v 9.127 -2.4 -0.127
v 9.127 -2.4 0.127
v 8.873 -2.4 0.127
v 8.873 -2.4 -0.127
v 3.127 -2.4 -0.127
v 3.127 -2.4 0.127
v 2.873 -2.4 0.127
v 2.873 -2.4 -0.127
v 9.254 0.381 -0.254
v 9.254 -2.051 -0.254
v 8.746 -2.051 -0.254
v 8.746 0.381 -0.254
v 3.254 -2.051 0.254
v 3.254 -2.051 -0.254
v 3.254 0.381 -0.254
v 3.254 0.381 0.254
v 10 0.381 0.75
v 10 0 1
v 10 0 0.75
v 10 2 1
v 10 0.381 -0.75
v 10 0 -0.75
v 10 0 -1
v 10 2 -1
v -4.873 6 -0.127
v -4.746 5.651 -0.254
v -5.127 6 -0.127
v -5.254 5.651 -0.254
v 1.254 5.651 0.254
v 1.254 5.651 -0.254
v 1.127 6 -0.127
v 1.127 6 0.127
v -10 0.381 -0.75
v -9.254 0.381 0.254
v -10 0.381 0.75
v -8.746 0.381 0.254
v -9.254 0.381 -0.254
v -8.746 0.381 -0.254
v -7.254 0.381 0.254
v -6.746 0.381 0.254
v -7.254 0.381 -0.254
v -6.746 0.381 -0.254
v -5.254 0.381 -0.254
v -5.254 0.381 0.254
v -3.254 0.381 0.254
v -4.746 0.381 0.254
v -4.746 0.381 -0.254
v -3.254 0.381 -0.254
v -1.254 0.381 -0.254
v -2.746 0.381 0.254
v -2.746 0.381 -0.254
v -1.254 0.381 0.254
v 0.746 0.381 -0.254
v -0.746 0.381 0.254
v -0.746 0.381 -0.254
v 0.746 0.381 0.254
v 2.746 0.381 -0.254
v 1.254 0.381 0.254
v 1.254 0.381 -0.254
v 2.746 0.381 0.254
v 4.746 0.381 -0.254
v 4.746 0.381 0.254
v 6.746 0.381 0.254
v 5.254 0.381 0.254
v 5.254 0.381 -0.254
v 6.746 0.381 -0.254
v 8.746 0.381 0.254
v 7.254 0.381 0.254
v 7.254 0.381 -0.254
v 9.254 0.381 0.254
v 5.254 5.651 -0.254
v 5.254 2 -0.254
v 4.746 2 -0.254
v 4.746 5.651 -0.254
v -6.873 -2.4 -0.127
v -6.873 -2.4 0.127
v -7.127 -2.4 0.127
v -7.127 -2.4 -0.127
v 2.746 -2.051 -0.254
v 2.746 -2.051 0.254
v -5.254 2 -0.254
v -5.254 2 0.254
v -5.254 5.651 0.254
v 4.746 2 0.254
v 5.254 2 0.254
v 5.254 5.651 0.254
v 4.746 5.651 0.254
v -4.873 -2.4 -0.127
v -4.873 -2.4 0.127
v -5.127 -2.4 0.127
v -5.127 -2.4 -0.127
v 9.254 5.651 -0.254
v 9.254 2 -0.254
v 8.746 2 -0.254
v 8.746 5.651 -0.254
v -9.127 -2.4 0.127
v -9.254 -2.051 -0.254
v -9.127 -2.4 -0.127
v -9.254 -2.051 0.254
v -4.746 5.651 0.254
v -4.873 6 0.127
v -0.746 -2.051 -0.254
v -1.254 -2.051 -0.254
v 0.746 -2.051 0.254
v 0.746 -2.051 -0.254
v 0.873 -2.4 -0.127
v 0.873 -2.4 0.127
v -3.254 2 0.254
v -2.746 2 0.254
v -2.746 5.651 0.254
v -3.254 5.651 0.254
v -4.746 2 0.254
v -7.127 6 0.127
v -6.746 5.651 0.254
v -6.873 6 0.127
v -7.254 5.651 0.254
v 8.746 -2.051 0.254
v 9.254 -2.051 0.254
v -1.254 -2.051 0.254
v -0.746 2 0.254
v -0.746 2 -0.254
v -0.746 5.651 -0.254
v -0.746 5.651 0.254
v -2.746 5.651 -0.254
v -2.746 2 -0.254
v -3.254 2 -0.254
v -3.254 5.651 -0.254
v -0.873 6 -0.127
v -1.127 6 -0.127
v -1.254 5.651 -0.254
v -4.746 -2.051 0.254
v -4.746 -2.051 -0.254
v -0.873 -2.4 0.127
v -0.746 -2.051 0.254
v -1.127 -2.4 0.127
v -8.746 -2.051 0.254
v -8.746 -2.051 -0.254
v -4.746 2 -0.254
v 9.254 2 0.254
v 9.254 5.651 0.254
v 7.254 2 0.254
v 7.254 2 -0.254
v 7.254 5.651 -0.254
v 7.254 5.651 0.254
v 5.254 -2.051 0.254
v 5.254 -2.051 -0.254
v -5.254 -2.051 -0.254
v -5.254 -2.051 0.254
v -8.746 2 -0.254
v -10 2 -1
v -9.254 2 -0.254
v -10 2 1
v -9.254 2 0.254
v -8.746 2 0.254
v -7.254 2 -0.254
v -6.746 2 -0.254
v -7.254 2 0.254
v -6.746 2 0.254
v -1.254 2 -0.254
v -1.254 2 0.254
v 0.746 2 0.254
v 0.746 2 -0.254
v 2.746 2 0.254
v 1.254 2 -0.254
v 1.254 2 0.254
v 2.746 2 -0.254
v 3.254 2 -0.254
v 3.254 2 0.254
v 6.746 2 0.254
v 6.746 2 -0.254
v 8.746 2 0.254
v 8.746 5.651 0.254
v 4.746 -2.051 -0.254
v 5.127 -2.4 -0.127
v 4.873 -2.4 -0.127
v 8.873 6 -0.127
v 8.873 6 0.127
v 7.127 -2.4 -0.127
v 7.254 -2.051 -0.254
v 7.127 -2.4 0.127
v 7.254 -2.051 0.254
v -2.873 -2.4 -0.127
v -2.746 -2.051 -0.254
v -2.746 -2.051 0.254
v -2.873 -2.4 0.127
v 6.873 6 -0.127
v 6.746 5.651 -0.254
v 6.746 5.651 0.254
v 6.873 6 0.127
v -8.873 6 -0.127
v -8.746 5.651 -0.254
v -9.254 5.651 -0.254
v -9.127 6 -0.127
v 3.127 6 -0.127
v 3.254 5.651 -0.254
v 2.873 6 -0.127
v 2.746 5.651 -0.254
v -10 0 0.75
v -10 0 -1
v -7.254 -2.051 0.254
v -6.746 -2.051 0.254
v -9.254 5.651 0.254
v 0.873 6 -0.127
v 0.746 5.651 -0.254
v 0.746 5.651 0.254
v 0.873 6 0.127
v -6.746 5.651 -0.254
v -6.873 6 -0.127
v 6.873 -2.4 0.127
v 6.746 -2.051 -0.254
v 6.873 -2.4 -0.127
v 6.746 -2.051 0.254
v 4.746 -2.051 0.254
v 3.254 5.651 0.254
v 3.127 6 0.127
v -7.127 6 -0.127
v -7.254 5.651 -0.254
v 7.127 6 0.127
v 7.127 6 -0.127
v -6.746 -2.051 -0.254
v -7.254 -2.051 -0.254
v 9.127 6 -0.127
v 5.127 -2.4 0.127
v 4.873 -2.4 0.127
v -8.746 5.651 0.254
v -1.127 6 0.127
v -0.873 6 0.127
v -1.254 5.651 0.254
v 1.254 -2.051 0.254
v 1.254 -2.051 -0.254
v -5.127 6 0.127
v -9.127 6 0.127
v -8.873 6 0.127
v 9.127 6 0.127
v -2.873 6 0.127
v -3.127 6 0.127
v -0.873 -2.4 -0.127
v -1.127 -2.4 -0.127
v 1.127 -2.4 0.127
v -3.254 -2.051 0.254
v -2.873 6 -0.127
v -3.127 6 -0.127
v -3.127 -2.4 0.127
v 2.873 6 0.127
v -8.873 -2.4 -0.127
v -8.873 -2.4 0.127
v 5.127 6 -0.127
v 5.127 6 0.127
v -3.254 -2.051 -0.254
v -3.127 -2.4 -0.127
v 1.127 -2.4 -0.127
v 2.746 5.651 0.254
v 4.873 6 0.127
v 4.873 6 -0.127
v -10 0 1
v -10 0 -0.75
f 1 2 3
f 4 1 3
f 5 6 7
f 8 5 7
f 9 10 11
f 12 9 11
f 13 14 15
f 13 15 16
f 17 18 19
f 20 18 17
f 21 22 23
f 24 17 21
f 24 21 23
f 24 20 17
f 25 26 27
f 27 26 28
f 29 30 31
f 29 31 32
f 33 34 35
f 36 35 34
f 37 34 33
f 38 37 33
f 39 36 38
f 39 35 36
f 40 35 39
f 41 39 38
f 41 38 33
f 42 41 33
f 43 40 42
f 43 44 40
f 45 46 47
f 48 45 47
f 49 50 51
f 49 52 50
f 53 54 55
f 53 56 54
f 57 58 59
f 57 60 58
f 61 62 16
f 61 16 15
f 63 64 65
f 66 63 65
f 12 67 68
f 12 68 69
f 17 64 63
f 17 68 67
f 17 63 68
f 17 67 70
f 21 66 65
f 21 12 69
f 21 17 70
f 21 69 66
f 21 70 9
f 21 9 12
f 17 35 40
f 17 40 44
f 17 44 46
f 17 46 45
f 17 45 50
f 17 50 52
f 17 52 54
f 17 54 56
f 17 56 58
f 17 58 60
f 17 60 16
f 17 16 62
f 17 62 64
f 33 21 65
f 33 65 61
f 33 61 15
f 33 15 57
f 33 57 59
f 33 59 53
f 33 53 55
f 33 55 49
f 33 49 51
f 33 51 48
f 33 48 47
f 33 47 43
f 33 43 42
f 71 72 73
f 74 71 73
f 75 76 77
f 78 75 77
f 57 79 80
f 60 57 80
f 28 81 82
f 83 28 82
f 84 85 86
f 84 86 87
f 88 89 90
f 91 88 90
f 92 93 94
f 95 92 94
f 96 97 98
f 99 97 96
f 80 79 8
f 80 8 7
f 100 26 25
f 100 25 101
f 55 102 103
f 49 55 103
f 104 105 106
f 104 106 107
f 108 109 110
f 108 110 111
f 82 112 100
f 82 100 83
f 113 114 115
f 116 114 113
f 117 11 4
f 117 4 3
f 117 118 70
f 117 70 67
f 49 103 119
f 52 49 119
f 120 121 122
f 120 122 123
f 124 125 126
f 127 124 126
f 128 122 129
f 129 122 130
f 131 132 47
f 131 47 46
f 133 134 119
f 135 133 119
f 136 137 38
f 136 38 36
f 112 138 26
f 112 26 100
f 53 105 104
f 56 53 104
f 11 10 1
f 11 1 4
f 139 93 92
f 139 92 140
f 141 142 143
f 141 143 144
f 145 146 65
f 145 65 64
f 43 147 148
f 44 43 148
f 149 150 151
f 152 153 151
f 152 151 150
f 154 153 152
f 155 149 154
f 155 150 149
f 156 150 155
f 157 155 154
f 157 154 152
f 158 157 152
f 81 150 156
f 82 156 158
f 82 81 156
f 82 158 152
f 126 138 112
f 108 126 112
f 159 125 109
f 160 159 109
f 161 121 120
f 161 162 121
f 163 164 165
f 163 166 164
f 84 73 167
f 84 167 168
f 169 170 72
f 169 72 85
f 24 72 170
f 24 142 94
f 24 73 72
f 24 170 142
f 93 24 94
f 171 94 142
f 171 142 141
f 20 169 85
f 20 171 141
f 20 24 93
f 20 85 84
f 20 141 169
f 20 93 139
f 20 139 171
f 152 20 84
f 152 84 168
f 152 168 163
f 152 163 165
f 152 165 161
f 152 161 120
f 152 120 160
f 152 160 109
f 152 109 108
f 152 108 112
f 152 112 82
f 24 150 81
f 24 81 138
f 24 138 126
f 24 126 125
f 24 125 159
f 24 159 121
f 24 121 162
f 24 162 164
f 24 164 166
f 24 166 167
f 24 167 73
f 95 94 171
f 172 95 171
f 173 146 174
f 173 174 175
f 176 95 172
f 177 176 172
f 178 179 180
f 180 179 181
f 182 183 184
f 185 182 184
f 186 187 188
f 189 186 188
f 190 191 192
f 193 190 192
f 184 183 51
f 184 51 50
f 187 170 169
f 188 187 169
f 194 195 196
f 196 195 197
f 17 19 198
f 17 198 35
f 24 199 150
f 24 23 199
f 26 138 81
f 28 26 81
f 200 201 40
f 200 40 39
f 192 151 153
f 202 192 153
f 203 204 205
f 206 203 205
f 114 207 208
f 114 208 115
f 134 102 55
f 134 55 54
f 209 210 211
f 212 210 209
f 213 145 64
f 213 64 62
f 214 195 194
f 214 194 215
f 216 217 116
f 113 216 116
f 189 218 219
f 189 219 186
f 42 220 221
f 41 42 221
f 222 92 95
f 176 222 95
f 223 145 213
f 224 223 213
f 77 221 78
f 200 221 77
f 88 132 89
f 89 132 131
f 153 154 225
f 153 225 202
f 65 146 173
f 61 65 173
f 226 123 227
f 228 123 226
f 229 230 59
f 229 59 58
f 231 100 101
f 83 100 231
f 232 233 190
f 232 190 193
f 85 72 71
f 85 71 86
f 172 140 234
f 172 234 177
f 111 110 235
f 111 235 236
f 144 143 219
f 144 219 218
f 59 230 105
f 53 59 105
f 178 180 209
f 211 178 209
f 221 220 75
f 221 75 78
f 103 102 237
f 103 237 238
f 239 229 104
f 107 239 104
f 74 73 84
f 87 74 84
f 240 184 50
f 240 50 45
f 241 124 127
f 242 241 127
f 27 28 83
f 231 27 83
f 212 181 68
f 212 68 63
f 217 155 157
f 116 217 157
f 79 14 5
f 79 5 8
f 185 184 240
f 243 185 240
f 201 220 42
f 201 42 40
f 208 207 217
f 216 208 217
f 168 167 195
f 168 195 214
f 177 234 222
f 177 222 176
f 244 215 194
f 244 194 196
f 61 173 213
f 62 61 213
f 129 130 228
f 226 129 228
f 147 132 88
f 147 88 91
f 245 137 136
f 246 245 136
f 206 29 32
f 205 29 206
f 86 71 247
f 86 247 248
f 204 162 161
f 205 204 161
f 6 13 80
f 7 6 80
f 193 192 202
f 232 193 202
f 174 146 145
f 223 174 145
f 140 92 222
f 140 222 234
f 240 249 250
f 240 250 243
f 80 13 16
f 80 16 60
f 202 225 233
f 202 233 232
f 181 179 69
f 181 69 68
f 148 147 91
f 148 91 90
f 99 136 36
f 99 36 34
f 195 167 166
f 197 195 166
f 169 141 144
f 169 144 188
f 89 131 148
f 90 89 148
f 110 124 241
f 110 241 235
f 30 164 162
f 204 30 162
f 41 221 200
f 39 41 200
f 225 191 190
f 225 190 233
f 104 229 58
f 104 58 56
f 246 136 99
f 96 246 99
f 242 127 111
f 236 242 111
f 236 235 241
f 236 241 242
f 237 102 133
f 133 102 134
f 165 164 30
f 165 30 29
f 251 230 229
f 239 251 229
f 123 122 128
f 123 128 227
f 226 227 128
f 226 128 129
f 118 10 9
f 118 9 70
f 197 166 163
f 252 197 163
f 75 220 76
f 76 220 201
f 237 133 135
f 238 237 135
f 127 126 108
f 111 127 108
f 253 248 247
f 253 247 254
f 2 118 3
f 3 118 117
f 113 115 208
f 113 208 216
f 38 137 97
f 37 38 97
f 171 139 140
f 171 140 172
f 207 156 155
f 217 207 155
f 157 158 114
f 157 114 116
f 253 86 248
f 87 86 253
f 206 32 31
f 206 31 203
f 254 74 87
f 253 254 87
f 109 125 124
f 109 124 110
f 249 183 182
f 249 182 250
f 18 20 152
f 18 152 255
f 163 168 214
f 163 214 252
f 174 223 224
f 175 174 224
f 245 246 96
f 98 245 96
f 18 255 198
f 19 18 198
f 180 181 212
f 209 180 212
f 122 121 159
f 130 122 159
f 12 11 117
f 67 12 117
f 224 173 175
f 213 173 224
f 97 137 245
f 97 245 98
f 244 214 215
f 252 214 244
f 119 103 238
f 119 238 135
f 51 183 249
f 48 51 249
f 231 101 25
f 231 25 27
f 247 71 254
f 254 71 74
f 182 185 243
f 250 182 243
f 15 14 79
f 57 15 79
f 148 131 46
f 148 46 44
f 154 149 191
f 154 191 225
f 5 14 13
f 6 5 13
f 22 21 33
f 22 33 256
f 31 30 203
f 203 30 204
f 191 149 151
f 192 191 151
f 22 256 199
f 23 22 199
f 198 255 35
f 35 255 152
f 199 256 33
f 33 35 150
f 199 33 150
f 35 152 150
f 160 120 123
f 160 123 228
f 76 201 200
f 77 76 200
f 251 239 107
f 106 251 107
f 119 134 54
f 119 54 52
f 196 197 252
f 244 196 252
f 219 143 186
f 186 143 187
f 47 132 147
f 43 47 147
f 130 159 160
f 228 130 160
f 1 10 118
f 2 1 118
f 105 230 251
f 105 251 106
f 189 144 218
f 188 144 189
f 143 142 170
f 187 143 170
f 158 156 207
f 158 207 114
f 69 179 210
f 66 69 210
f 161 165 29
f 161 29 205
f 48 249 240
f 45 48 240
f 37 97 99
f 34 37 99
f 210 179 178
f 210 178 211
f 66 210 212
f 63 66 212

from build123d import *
from OCP.BRepFilletAPI import BRepFilletAPI_MakeChamfer

# Parameters (mm, degrees)
BASE_EXTRUDE_DEPTH                 = 10
PINBODY_START                      = -4.4
SKETCH2_W                          = 0.508
SKETCH2_H                          = 0.508
PINBODY_DEPTH                      = 8.4
PINSCHAMFER_SIZE                   = 0.127
PINSCHAMFER_SIZE2                  = 0.348929632
LPATTERN1_COUNT                    = 5
LPATTERN1_PITCH                    = 2
PINSCHAMFER_OF_LPATTERN1_SIZE      = 0.127
PINSCHAMFER_OF_LPATTERN1_SIZE2     = 0.348929632
LPATTERN1_COL_COUNT                = 6
LPATTERN1_COL_PITCH                = 2.000000064
PINSCHAMFER_OF_LPATTERN1_COL_SIZE  = 0.127
PINSCHAMFER_OF_LPATTERN1_COL_SIZE2 = 0.348929632


with BuildPart() as part:
    # Sketch1 → Base-Extrude (new, symmetric)
    with BuildSketch(Plane(origin=(0, 0, 0), x_dir=(0, 0, -1), z_dir=(1, 0, 0))):
        Polygon((1, 0.409926053), (1, 2), (-1, 2), (-1, 0.409926053), (-1, 0), (-0.75, 0), (-0.75, 0.381), (0.75, 0.381), (0.75, 0), (1, 0), align=None)
    extrude(amount=BASE_EXTRUDE_DEPTH, both=True)

    # Sketch2 → PINBODY (add)
    with BuildSketch(Plane(origin=(0, 2, 0), x_dir=(-1, 0, 0), z_dir=(0, 1, 0)).offset(PINBODY_START)):
        with Locations((1, 0)):
            Rectangle(SKETCH2_W, SKETCH2_H)
    pinbody = extrude(amount=PINBODY_DEPTH)

    # pinsCHAMFER: one chamfer whose edges measure the first distance from different faces: ONE call of the kernel's chamfer builder (chamfer() names one face for all edges)
    pinschamfer_edges_1 = [part.edges().sort_by_distance(p)[0] for p in [
        (-1.254, -2.4, 0),
        (-1, -2.4, 0.254),
        (-0.746, -2.4, 0),
        (-1, -2.4, -0.254),
    ]]
    pinschamfer_side_1 = [part.faces().sort_by_distance(p)[0] for p in [
        (-1, -2.4, 0),
    ]]
    pinschamfer_edges_2 = [part.edges().sort_by_distance(p)[0] for p in [
        (-1.254, 6, 0),
        (-1, 6, 0.254),
        (-0.746, 6, 0),
        (-1, 6, -0.254),
    ]]
    pinschamfer_side_2 = [part.faces().sort_by_distance(p)[0] for p in [
        (-1, 6, 0),
    ]]
    pinschamfer = BRepFilletAPI_MakeChamfer(part.part.solid().wrapped)
    for e in pinschamfer_edges_1:
        pinschamfer.Add(PINSCHAMFER_SIZE, PINSCHAMFER_SIZE2, e.wrapped, pinschamfer_side_1[0].wrapped)  # the first distance lies on this face
    for e in pinschamfer_edges_2:
        pinschamfer.Add(PINSCHAMFER_SIZE, PINSCHAMFER_SIZE2, e.wrapped, pinschamfer_side_2[0].wrapped)  # the first distance lies on this face
    add(Compound.cast(pinschamfer.Shape()), mode=Mode.REPLACE)

    # LPattern1: PINBODY ×5
    with Locations(*[(-i * LPATTERN1_PITCH, 0, 0) for i in range(1, LPATTERN1_COUNT)]):
        add(pinbody)

    # pinsCHAMFER of LPattern1: one chamfer whose edges measure the first distance from different faces: ONE call of the kernel's chamfer builder (chamfer() names one face for all edges)
    pinschamfer_of_lpattern1_edges_1 = [part.edges().sort_by_distance(p)[0] for p in [
        (-3.254, -2.4, 0),
        (-3, -2.4, 0.254),
        (-2.746, -2.4, 0),
        (-3, -2.4, -0.254),
    ]]
    pinschamfer_of_lpattern1_side_1 = [part.faces().sort_by_distance(p)[0] for p in [
        (-3, -2.4, 0),
    ]]
    pinschamfer_of_lpattern1_edges_2 = [part.edges().sort_by_distance(p)[0] for p in [
        (-3.254, 6, 0),
        (-3, 6, 0.254),
        (-2.746, 6, 0),
        (-3, 6, -0.254),
    ]]
    pinschamfer_of_lpattern1_side_2 = [part.faces().sort_by_distance(p)[0] for p in [
        (-3, 6, 0),
    ]]
    pinschamfer_of_lpattern1_edges_3 = [part.edges().sort_by_distance(p)[0] for p in [
        (-5.254, -2.4, 0),
        (-5, -2.4, 0.254),
        (-4.746, -2.4, 0),
        (-5, -2.4, -0.254),
    ]]
    pinschamfer_of_lpattern1_side_3 = [part.faces().sort_by_distance(p)[0] for p in [
        (-5, -2.4, 0),
    ]]
    pinschamfer_of_lpattern1_edges_4 = [part.edges().sort_by_distance(p)[0] for p in [
        (-5.254, 6, 0),
        (-5, 6, 0.254),
        (-4.746, 6, 0),
        (-5, 6, -0.254),
    ]]
    pinschamfer_of_lpattern1_side_4 = [part.faces().sort_by_distance(p)[0] for p in [
        (-5, 6, 0),
    ]]
    pinschamfer_of_lpattern1_edges_5 = [part.edges().sort_by_distance(p)[0] for p in [
        (-7.254, -2.4, 0),
        (-7, -2.4, 0.254),
        (-6.746, -2.4, 0),
        (-7, -2.4, -0.254),
    ]]
    pinschamfer_of_lpattern1_side_5 = [part.faces().sort_by_distance(p)[0] for p in [
        (-7, -2.4, 0),
    ]]
    pinschamfer_of_lpattern1_edges_6 = [part.edges().sort_by_distance(p)[0] for p in [
        (-7.254, 6, 0),
        (-7, 6, 0.254),
        (-6.746, 6, 0),
        (-7, 6, -0.254),
    ]]
    pinschamfer_of_lpattern1_side_6 = [part.faces().sort_by_distance(p)[0] for p in [
        (-7, 6, 0),
    ]]
    pinschamfer_of_lpattern1_edges_7 = [part.edges().sort_by_distance(p)[0] for p in [
        (-9.254, -2.4, 0),
        (-9, -2.4, 0.254),
        (-8.746, -2.4, 0),
        (-9, -2.4, -0.254),
    ]]
    pinschamfer_of_lpattern1_side_7 = [part.faces().sort_by_distance(p)[0] for p in [
        (-9, -2.4, 0),
    ]]
    pinschamfer_of_lpattern1_edges_8 = [part.edges().sort_by_distance(p)[0] for p in [
        (-9.254, 6, 0),
        (-9, 6, 0.254),
        (-8.746, 6, 0),
        (-9, 6, -0.254),
    ]]
    pinschamfer_of_lpattern1_side_8 = [part.faces().sort_by_distance(p)[0] for p in [
        (-9, 6, 0),
    ]]
    pinschamfer_of_lpattern1 = BRepFilletAPI_MakeChamfer(part.part.solid().wrapped)
    for e in pinschamfer_of_lpattern1_edges_1:
        pinschamfer_of_lpattern1.Add(PINSCHAMFER_OF_LPATTERN1_SIZE, PINSCHAMFER_OF_LPATTERN1_SIZE2, e.wrapped, pinschamfer_of_lpattern1_side_1[0].wrapped)  # the first distance lies on this face
    for e in pinschamfer_of_lpattern1_edges_2:
        pinschamfer_of_lpattern1.Add(PINSCHAMFER_OF_LPATTERN1_SIZE, PINSCHAMFER_OF_LPATTERN1_SIZE2, e.wrapped, pinschamfer_of_lpattern1_side_2[0].wrapped)  # the first distance lies on this face
    for e in pinschamfer_of_lpattern1_edges_3:
        pinschamfer_of_lpattern1.Add(PINSCHAMFER_OF_LPATTERN1_SIZE, PINSCHAMFER_OF_LPATTERN1_SIZE2, e.wrapped, pinschamfer_of_lpattern1_side_3[0].wrapped)  # the first distance lies on this face
    for e in pinschamfer_of_lpattern1_edges_4:
        pinschamfer_of_lpattern1.Add(PINSCHAMFER_OF_LPATTERN1_SIZE, PINSCHAMFER_OF_LPATTERN1_SIZE2, e.wrapped, pinschamfer_of_lpattern1_side_4[0].wrapped)  # the first distance lies on this face
    for e in pinschamfer_of_lpattern1_edges_5:
        pinschamfer_of_lpattern1.Add(PINSCHAMFER_OF_LPATTERN1_SIZE, PINSCHAMFER_OF_LPATTERN1_SIZE2, e.wrapped, pinschamfer_of_lpattern1_side_5[0].wrapped)  # the first distance lies on this face
    for e in pinschamfer_of_lpattern1_edges_6:
        pinschamfer_of_lpattern1.Add(PINSCHAMFER_OF_LPATTERN1_SIZE, PINSCHAMFER_OF_LPATTERN1_SIZE2, e.wrapped, pinschamfer_of_lpattern1_side_6[0].wrapped)  # the first distance lies on this face
    for e in pinschamfer_of_lpattern1_edges_7:
        pinschamfer_of_lpattern1.Add(PINSCHAMFER_OF_LPATTERN1_SIZE, PINSCHAMFER_OF_LPATTERN1_SIZE2, e.wrapped, pinschamfer_of_lpattern1_side_7[0].wrapped)  # the first distance lies on this face
    for e in pinschamfer_of_lpattern1_edges_8:
        pinschamfer_of_lpattern1.Add(PINSCHAMFER_OF_LPATTERN1_SIZE, PINSCHAMFER_OF_LPATTERN1_SIZE2, e.wrapped, pinschamfer_of_lpattern1_side_8[0].wrapped)  # the first distance lies on this face
    add(Compound.cast(pinschamfer_of_lpattern1.Shape()), mode=Mode.REPLACE)

    # LPattern1 col: PINBODY ×6
    with Locations(*[(i * LPATTERN1_COL_PITCH, 0, 0) for i in range(1, LPATTERN1_COL_COUNT)]):
        add(pinbody)

    # pinsCHAMFER of LPattern1 col: one chamfer whose edges measure the first distance from different faces: ONE call of the kernel's chamfer builder (chamfer() names one face for all edges)
    pinschamfer_of_lpattern1_col_edges_1 = [part.edges().sort_by_distance(p)[0] for p in [
        (0.746000064, -2.4, 0),
        (1.000000064, -2.4, 0.254),
        (1.254000064, -2.4, 0),
        (1.000000064, -2.4, -0.254),
    ]]
    pinschamfer_of_lpattern1_col_side_1 = [part.faces().sort_by_distance(p)[0] for p in [
        (1.000000064, -2.4, 0),
    ]]
    pinschamfer_of_lpattern1_col_edges_2 = [part.edges().sort_by_distance(p)[0] for p in [
        (0.746000064, 6, 0),
        (1.000000064, 6, 0.254),
        (1.254000064, 6, 0),
        (1.000000064, 6, -0.254),
    ]]
    pinschamfer_of_lpattern1_col_side_2 = [part.faces().sort_by_distance(p)[0] for p in [
        (1.000000064, 6, 0),
    ]]
    pinschamfer_of_lpattern1_col_edges_3 = [part.edges().sort_by_distance(p)[0] for p in [
        (2.746000128, -2.4, 0),
        (3.000000128, -2.4, 0.254),
        (3.254000128, -2.4, 0),
        (3.000000128, -2.4, -0.254),
    ]]
    pinschamfer_of_lpattern1_col_side_3 = [part.faces().sort_by_distance(p)[0] for p in [
        (3.000000128, -2.4, 0),
    ]]
    pinschamfer_of_lpattern1_col_edges_4 = [part.edges().sort_by_distance(p)[0] for p in [
        (2.746000128, 6, 0),
        (3.000000128, 6, 0.254),
        (3.254000128, 6, 0),
        (3.000000128, 6, -0.254),
    ]]
    pinschamfer_of_lpattern1_col_side_4 = [part.faces().sort_by_distance(p)[0] for p in [
        (3.000000128, 6, 0),
    ]]
    pinschamfer_of_lpattern1_col_edges_5 = [part.edges().sort_by_distance(p)[0] for p in [
        (4.746000192, -2.4, 0),
        (5.000000192, -2.4, 0.254),
        (5.254000192, -2.4, 0),
        (5.000000192, -2.4, -0.254),
    ]]
    pinschamfer_of_lpattern1_col_side_5 = [part.faces().sort_by_distance(p)[0] for p in [
        (5.000000192, -2.4, 0),
    ]]
    pinschamfer_of_lpattern1_col_edges_6 = [part.edges().sort_by_distance(p)[0] for p in [
        (4.746000192, 6, 0),
        (5.000000192, 6, 0.254),
        (5.254000192, 6, 0),
        (5.000000192, 6, -0.254),
    ]]
    pinschamfer_of_lpattern1_col_side_6 = [part.faces().sort_by_distance(p)[0] for p in [
        (5.000000192, 6, 0),
    ]]
    pinschamfer_of_lpattern1_col_edges_7 = [part.edges().sort_by_distance(p)[0] for p in [
        (6.746000256, -2.4, 0),
        (7.000000256, -2.4, 0.254),
        (7.254000256, -2.4, 0),
        (7.000000256, -2.4, -0.254),
    ]]
    pinschamfer_of_lpattern1_col_side_7 = [part.faces().sort_by_distance(p)[0] for p in [
        (7.000000256, -2.4, 0),
    ]]
    pinschamfer_of_lpattern1_col_edges_8 = [part.edges().sort_by_distance(p)[0] for p in [
        (6.746000256, 6, 0),
        (7.000000256, 6, 0.254),
        (7.254000256, 6, 0),
        (7.000000256, 6, -0.254),
    ]]
    pinschamfer_of_lpattern1_col_side_8 = [part.faces().sort_by_distance(p)[0] for p in [
        (7.000000256, 6, 0),
    ]]
    pinschamfer_of_lpattern1_col_edges_9 = [part.edges().sort_by_distance(p)[0] for p in [
        (8.74600032, -2.4, 0),
        (9.00000032, -2.4, 0.254),
        (9.25400032, -2.4, 0),
        (9.00000032, -2.4, -0.254),
    ]]
    pinschamfer_of_lpattern1_col_side_9 = [part.faces().sort_by_distance(p)[0] for p in [
        (9.00000032, -2.4, 0),
    ]]
    pinschamfer_of_lpattern1_col_edges_10 = [part.edges().sort_by_distance(p)[0] for p in [
        (8.74600032, 6, 0),
        (9.00000032, 6, 0.254),
        (9.25400032, 6, 0),
        (9.00000032, 6, -0.254),
    ]]
    pinschamfer_of_lpattern1_col_side_10 = [part.faces().sort_by_distance(p)[0] for p in [
        (9.00000032, 6, 0),
    ]]
    pinschamfer_of_lpattern1_col = BRepFilletAPI_MakeChamfer(part.part.solid().wrapped)
    for e in pinschamfer_of_lpattern1_col_edges_1:
        pinschamfer_of_lpattern1_col.Add(PINSCHAMFER_OF_LPATTERN1_COL_SIZE, PINSCHAMFER_OF_LPATTERN1_COL_SIZE2, e.wrapped, pinschamfer_of_lpattern1_col_side_1[0].wrapped)  # the first distance lies on this face
    for e in pinschamfer_of_lpattern1_col_edges_2:
        pinschamfer_of_lpattern1_col.Add(PINSCHAMFER_OF_LPATTERN1_COL_SIZE, PINSCHAMFER_OF_LPATTERN1_COL_SIZE2, e.wrapped, pinschamfer_of_lpattern1_col_side_2[0].wrapped)  # the first distance lies on this face
    for e in pinschamfer_of_lpattern1_col_edges_3:
        pinschamfer_of_lpattern1_col.Add(PINSCHAMFER_OF_LPATTERN1_COL_SIZE, PINSCHAMFER_OF_LPATTERN1_COL_SIZE2, e.wrapped, pinschamfer_of_lpattern1_col_side_3[0].wrapped)  # the first distance lies on this face
    for e in pinschamfer_of_lpattern1_col_edges_4:
        pinschamfer_of_lpattern1_col.Add(PINSCHAMFER_OF_LPATTERN1_COL_SIZE, PINSCHAMFER_OF_LPATTERN1_COL_SIZE2, e.wrapped, pinschamfer_of_lpattern1_col_side_4[0].wrapped)  # the first distance lies on this face
    for e in pinschamfer_of_lpattern1_col_edges_5:
        pinschamfer_of_lpattern1_col.Add(PINSCHAMFER_OF_LPATTERN1_COL_SIZE, PINSCHAMFER_OF_LPATTERN1_COL_SIZE2, e.wrapped, pinschamfer_of_lpattern1_col_side_5[0].wrapped)  # the first distance lies on this face
    for e in pinschamfer_of_lpattern1_col_edges_6:
        pinschamfer_of_lpattern1_col.Add(PINSCHAMFER_OF_LPATTERN1_COL_SIZE, PINSCHAMFER_OF_LPATTERN1_COL_SIZE2, e.wrapped, pinschamfer_of_lpattern1_col_side_6[0].wrapped)  # the first distance lies on this face
    for e in pinschamfer_of_lpattern1_col_edges_7:
        pinschamfer_of_lpattern1_col.Add(PINSCHAMFER_OF_LPATTERN1_COL_SIZE, PINSCHAMFER_OF_LPATTERN1_COL_SIZE2, e.wrapped, pinschamfer_of_lpattern1_col_side_7[0].wrapped)  # the first distance lies on this face
    for e in pinschamfer_of_lpattern1_col_edges_8:
        pinschamfer_of_lpattern1_col.Add(PINSCHAMFER_OF_LPATTERN1_COL_SIZE, PINSCHAMFER_OF_LPATTERN1_COL_SIZE2, e.wrapped, pinschamfer_of_lpattern1_col_side_8[0].wrapped)  # the first distance lies on this face
    for e in pinschamfer_of_lpattern1_col_edges_9:
        pinschamfer_of_lpattern1_col.Add(PINSCHAMFER_OF_LPATTERN1_COL_SIZE, PINSCHAMFER_OF_LPATTERN1_COL_SIZE2, e.wrapped, pinschamfer_of_lpattern1_col_side_9[0].wrapped)  # the first distance lies on this face
    for e in pinschamfer_of_lpattern1_col_edges_10:
        pinschamfer_of_lpattern1_col.Add(PINSCHAMFER_OF_LPATTERN1_COL_SIZE, PINSCHAMFER_OF_LPATTERN1_COL_SIZE2, e.wrapped, pinschamfer_of_lpattern1_col_side_10[0].wrapped)  # the first distance lies on this face
    add(Compound.cast(pinschamfer_of_lpattern1_col.Shape()), mode=Mode.REPLACE)


solid = part.part
